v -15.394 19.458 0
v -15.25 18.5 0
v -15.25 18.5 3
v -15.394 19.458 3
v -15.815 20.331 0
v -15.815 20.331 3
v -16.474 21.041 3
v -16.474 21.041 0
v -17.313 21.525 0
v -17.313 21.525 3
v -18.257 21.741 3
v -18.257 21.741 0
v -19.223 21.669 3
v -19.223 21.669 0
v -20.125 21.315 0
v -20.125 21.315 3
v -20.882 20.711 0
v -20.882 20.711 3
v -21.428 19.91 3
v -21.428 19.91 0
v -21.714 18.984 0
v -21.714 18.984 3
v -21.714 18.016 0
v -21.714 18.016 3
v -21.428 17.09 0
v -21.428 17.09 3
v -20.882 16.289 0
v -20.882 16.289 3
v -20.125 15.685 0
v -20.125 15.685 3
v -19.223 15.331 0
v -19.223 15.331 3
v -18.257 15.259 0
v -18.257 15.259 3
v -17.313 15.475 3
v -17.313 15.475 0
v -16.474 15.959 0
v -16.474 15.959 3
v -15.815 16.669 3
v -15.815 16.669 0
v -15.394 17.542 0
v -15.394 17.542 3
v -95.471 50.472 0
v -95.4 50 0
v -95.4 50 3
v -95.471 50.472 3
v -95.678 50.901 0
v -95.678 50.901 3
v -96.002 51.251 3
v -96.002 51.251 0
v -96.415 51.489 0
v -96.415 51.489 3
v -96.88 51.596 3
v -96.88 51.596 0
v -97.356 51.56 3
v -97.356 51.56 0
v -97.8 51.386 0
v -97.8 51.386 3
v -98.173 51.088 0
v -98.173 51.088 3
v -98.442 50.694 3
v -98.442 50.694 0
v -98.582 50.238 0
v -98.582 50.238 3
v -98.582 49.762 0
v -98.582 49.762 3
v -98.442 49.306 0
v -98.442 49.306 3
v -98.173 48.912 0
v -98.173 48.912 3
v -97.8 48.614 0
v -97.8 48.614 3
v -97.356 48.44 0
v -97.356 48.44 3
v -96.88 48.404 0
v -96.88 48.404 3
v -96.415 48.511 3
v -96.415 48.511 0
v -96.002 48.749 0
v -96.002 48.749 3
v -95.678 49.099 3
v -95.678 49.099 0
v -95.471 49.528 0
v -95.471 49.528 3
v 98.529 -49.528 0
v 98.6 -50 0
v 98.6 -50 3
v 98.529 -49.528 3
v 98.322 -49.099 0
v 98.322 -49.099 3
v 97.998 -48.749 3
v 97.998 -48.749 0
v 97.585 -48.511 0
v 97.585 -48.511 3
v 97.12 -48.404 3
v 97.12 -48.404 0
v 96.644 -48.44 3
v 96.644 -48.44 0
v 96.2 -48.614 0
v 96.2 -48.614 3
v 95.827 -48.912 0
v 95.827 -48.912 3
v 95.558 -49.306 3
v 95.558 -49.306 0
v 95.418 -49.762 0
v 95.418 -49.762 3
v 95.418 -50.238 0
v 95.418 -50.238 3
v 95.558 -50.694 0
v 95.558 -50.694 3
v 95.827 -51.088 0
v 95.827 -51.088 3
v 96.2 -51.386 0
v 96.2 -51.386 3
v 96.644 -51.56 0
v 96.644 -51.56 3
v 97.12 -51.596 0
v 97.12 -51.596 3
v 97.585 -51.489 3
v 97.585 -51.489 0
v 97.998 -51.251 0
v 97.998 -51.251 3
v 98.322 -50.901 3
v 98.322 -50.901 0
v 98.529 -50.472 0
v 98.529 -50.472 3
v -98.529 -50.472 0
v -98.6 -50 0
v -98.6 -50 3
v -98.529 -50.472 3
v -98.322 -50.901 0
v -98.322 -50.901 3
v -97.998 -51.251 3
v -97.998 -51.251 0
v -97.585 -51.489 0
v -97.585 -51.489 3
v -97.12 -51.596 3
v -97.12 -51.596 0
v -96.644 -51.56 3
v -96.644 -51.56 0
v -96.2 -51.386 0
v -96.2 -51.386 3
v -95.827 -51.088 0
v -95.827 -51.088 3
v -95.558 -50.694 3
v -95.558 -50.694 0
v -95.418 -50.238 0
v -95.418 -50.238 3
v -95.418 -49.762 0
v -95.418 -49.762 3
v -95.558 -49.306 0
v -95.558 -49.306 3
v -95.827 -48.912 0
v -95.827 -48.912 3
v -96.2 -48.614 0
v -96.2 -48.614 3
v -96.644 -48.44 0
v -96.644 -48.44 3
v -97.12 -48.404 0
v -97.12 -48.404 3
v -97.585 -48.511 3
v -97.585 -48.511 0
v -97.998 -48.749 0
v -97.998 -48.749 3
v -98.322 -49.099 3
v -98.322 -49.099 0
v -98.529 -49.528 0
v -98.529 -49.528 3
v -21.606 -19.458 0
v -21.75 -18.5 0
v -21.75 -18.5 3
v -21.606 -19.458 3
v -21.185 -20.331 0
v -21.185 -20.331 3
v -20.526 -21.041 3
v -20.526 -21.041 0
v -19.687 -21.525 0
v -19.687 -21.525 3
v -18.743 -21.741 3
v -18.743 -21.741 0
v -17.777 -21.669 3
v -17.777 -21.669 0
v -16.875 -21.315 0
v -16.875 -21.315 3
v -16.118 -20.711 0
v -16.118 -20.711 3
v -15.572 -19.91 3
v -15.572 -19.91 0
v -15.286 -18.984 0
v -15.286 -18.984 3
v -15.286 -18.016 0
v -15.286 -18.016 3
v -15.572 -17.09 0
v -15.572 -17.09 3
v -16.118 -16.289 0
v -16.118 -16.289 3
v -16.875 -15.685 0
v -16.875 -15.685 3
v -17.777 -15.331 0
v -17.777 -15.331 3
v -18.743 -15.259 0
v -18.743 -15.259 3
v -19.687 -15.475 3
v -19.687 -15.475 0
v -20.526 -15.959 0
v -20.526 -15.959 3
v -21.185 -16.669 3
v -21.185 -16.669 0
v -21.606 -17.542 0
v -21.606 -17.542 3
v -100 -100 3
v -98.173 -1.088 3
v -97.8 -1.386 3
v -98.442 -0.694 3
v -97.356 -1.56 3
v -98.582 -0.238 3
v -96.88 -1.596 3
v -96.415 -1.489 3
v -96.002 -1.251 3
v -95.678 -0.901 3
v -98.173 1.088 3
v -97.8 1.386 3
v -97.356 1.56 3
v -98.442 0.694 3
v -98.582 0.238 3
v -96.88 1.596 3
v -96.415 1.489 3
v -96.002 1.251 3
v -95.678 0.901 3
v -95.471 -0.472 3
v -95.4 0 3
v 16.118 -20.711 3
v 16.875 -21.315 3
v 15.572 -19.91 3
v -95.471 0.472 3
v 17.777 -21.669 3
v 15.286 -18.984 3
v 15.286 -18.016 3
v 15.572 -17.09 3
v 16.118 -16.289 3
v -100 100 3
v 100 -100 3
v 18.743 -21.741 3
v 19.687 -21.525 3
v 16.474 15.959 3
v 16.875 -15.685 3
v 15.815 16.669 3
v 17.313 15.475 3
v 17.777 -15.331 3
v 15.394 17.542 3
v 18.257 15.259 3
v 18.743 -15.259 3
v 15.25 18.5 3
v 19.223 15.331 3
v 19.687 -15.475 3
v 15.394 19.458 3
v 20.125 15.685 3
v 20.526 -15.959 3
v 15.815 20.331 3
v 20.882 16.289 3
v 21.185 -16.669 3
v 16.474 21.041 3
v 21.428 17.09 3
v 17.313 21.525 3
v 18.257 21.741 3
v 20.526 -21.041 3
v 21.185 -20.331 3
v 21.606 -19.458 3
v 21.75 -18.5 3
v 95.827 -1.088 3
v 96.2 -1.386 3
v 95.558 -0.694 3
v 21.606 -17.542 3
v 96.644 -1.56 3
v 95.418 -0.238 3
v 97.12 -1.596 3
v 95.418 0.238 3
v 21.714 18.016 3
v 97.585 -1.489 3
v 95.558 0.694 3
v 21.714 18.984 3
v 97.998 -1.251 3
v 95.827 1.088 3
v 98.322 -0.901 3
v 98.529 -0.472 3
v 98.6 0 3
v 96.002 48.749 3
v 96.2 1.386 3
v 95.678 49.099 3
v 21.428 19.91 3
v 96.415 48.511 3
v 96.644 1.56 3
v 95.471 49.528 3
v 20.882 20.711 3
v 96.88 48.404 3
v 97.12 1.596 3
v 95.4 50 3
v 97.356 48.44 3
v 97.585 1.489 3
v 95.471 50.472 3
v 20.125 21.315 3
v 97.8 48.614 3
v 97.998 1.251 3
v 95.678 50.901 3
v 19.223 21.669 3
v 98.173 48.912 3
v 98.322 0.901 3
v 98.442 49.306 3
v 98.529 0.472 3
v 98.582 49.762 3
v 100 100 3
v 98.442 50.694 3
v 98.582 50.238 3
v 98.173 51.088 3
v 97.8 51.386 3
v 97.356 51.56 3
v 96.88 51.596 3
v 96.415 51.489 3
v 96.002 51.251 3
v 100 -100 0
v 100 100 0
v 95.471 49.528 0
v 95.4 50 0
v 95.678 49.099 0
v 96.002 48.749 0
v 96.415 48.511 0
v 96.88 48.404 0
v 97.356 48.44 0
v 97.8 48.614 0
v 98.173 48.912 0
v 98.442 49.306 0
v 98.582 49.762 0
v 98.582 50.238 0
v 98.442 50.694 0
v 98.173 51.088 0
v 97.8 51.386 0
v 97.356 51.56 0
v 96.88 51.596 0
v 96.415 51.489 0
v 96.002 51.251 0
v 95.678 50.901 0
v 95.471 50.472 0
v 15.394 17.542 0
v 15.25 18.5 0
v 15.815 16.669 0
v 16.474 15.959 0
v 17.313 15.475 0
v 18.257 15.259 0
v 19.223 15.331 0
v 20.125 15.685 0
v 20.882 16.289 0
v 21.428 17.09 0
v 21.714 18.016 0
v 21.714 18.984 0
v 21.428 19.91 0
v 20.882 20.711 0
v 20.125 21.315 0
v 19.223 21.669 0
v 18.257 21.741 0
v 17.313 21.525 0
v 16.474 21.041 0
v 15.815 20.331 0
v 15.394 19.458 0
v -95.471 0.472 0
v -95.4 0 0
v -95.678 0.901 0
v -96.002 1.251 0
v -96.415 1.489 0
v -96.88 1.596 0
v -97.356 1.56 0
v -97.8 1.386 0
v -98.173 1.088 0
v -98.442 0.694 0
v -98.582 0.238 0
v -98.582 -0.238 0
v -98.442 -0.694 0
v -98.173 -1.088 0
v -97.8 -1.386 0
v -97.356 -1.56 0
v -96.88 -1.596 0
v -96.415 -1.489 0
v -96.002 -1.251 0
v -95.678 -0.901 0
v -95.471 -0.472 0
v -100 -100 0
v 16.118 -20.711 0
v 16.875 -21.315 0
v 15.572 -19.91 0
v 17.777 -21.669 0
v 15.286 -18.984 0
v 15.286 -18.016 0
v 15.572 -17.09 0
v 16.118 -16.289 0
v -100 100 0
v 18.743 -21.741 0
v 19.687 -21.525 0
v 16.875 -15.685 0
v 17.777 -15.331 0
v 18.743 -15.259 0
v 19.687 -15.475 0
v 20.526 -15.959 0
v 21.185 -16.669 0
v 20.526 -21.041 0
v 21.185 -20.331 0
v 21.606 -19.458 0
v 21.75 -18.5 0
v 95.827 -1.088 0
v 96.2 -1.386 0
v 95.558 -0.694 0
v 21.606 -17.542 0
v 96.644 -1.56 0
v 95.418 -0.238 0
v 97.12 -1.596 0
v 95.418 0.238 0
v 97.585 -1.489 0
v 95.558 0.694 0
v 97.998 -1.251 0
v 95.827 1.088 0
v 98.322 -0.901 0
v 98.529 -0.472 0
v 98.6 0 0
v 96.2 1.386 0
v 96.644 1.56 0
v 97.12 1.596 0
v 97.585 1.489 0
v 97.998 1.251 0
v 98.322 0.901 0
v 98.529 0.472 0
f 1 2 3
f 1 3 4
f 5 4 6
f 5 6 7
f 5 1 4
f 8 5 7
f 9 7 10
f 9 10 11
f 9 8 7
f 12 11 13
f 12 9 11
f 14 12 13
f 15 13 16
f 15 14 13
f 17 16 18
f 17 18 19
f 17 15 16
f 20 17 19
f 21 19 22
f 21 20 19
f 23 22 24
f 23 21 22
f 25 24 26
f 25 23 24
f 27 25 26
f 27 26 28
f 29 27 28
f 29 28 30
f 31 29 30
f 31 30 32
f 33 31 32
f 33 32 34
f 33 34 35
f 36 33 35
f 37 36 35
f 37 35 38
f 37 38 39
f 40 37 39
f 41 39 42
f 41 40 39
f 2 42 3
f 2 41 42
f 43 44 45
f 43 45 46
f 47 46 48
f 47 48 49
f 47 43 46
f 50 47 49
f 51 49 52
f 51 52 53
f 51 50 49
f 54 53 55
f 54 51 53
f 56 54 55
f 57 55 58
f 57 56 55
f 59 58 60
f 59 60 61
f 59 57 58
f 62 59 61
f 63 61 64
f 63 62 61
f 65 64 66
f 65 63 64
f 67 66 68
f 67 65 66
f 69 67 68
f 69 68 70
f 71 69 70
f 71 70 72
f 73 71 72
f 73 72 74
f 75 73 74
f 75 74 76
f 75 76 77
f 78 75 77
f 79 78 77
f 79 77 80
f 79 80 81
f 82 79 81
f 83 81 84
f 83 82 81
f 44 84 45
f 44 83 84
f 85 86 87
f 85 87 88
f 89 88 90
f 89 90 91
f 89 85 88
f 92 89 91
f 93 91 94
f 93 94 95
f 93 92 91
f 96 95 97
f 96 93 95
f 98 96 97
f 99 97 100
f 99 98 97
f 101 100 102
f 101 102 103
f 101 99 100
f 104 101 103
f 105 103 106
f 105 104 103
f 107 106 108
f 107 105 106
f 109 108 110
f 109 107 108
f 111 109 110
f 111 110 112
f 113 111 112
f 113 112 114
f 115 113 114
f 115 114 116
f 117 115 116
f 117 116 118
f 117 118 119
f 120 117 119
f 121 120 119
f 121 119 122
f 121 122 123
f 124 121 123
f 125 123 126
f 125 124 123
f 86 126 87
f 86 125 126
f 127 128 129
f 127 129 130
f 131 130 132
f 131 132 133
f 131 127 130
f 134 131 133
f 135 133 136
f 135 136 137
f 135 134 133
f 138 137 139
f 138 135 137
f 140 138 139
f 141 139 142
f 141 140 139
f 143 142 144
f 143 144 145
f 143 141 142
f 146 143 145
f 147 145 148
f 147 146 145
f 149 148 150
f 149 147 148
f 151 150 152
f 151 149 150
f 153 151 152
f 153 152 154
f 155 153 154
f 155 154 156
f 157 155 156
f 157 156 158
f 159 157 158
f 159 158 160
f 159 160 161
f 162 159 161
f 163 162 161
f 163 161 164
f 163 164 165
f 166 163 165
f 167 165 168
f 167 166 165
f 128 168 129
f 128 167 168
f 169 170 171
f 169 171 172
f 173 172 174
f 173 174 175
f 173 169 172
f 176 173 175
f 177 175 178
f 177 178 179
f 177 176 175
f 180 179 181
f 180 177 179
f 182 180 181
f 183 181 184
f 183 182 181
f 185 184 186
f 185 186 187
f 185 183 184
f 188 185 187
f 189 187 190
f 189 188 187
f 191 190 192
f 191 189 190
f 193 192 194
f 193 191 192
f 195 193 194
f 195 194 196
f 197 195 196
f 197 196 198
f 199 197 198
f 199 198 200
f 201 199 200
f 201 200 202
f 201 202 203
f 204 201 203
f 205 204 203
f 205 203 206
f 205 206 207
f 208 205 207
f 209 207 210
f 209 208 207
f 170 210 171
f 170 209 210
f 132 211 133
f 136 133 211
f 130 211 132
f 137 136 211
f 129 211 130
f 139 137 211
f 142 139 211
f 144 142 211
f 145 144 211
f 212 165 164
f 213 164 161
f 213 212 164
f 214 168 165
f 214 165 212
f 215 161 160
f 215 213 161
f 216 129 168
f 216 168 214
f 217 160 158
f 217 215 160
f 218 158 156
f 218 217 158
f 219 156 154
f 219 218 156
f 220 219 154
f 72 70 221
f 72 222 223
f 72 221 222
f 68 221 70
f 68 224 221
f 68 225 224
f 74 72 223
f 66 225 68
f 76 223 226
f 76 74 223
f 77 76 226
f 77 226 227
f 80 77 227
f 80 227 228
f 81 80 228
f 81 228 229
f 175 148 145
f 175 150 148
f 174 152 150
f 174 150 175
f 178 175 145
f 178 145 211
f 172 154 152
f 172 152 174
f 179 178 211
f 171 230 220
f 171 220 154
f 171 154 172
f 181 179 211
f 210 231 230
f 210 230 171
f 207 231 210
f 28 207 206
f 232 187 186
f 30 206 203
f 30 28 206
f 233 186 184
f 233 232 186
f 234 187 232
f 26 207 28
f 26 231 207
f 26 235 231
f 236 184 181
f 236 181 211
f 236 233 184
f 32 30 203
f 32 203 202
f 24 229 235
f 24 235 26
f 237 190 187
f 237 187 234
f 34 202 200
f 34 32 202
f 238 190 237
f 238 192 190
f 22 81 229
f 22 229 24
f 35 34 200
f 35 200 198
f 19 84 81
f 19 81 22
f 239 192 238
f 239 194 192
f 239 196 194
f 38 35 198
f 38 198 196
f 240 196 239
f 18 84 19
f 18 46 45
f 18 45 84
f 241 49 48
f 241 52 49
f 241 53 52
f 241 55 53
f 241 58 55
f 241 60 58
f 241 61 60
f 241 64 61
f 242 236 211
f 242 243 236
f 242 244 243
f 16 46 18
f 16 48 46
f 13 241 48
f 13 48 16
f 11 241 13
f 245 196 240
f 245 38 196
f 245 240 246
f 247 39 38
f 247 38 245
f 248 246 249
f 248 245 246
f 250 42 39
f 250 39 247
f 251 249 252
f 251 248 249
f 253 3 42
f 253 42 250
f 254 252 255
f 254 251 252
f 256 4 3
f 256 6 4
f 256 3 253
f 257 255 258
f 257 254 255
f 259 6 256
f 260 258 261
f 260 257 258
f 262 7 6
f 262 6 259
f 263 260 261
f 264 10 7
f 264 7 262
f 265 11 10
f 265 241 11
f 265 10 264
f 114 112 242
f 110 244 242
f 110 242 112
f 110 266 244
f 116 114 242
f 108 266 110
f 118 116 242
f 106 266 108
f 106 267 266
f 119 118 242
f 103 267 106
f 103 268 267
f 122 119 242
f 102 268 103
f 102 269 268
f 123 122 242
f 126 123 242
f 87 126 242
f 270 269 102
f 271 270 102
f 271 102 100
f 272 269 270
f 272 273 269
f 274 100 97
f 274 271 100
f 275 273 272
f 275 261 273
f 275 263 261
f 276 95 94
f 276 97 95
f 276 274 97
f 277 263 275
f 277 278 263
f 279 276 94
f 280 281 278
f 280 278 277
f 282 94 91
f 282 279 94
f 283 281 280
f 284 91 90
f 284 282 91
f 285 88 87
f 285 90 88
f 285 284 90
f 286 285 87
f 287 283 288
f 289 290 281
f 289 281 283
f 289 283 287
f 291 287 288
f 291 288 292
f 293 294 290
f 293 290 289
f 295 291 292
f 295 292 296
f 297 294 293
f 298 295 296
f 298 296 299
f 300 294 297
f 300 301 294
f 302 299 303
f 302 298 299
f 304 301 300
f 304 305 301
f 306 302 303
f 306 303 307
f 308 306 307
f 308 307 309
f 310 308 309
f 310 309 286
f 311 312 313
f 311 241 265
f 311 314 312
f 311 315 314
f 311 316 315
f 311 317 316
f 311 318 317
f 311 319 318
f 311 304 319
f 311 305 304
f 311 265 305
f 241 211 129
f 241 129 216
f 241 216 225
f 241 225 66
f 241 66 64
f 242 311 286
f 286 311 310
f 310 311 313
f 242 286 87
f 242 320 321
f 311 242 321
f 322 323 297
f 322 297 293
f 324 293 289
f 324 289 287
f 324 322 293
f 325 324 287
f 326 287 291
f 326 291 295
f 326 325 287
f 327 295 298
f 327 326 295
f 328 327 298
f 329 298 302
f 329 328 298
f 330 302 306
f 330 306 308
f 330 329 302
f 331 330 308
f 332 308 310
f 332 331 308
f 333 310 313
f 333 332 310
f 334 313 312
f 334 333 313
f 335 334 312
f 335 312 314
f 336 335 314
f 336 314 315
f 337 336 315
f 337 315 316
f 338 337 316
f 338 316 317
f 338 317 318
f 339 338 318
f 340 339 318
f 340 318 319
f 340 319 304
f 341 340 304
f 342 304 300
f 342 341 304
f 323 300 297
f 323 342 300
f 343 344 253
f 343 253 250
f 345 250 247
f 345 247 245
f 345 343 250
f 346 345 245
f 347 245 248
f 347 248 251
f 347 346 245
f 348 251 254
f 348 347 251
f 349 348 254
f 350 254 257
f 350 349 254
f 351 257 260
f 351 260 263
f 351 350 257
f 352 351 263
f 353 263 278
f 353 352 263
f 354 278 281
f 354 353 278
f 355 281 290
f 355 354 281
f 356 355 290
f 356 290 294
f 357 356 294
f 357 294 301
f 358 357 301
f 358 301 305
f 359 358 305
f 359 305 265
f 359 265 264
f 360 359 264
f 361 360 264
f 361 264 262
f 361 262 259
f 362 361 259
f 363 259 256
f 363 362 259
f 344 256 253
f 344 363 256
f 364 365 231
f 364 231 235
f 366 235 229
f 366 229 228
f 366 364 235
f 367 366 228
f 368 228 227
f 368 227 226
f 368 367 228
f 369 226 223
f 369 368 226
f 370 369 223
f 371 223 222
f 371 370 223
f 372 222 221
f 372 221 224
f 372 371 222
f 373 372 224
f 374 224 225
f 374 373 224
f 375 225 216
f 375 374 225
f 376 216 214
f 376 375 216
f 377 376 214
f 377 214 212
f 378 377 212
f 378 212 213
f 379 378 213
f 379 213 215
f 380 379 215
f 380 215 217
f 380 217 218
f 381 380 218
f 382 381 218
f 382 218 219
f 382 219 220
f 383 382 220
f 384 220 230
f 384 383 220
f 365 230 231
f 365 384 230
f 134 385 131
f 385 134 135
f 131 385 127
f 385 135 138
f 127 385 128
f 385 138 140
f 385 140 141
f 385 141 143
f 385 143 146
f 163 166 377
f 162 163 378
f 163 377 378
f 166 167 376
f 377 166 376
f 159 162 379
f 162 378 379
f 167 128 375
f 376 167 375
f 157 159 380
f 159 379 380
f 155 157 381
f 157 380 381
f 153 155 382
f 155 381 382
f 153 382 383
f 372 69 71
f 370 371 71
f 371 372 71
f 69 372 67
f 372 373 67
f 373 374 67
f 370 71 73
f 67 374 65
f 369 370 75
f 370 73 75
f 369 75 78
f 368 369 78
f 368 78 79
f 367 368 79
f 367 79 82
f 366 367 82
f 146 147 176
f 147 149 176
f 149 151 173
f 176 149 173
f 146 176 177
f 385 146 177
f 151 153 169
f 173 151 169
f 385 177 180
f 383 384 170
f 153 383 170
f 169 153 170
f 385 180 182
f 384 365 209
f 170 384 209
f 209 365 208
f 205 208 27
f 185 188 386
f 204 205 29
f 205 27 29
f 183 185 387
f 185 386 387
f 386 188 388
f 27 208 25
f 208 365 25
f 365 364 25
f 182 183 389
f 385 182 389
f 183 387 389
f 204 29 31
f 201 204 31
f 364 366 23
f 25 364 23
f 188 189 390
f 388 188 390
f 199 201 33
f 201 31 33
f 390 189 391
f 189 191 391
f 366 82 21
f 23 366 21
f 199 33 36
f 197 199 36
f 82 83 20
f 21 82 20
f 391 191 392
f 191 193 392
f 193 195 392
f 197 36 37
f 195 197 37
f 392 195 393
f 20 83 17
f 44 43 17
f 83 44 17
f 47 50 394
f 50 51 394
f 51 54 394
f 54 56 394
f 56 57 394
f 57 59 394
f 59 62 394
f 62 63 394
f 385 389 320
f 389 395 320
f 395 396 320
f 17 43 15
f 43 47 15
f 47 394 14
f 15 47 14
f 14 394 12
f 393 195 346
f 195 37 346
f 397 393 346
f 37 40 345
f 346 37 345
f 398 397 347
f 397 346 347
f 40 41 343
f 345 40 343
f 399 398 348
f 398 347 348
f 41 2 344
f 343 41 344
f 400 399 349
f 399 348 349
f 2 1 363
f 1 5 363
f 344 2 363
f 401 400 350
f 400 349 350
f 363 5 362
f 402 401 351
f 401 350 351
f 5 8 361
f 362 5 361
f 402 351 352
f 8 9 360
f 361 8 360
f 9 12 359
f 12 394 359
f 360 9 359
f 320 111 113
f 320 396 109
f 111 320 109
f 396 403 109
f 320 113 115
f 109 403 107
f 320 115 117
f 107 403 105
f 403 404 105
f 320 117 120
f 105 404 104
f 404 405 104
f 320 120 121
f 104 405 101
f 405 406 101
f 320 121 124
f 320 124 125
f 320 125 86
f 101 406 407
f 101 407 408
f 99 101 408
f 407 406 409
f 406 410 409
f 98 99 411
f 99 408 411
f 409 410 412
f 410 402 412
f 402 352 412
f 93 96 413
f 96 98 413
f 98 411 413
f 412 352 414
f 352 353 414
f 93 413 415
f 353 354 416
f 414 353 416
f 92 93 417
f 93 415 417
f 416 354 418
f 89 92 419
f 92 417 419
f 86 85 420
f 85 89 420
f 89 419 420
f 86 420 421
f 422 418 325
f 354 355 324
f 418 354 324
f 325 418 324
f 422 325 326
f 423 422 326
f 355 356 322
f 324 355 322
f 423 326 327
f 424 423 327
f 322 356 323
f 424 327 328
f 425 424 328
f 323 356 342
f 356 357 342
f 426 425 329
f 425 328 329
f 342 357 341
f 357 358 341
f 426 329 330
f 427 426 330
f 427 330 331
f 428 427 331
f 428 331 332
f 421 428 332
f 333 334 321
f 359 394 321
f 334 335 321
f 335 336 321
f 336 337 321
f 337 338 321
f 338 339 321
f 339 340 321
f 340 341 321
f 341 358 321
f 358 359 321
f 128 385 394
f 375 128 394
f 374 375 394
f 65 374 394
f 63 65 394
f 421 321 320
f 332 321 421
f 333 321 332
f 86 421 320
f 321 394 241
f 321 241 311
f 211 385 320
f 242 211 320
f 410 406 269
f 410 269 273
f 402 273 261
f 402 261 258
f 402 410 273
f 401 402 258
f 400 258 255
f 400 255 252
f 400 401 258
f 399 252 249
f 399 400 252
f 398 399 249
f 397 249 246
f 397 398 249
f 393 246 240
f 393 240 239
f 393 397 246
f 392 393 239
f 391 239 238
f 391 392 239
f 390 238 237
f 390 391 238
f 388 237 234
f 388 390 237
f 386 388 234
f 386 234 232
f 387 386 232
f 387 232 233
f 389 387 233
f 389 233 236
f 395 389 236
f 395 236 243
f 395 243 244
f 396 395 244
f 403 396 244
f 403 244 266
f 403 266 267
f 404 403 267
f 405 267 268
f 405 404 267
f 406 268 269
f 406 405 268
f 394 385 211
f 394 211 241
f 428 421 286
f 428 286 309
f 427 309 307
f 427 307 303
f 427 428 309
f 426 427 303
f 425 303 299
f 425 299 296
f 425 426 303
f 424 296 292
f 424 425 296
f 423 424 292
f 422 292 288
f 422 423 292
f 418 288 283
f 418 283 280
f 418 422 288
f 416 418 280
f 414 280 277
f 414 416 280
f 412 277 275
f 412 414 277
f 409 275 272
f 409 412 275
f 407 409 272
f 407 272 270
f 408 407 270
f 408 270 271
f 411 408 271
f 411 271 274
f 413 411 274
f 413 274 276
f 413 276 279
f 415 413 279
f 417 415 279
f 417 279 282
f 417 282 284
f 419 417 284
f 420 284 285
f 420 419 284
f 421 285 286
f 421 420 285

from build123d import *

# Parameters (mm, degrees)
SKETCH_1_W      = 200
SKETCH_1_H      = 200
SKETCH_1_R      = 3.25
SKETCH_1_R_2    = 1.6
EXTRUDE_1_DEPTH = 3


with BuildPart() as part:
    # 草图1 → 凸台-拉伸1 (new body)
    with BuildSketch(Plane.XY):
        Rectangle(SKETCH_1_W, SKETCH_1_H)
        with Locations((-18.5, 18.5)):
            Circle(SKETCH_1_R, mode=Mode.SUBTRACT)
        with Locations(Location((18.5, 18.5, 0), (0, 0, 180))):
            Circle(SKETCH_1_R, mode=Mode.SUBTRACT)
        with Locations((18.5, -18.5)):
            Circle(SKETCH_1_R, mode=Mode.SUBTRACT)
        with Locations(Location((-18.5, -18.5, 0), (0, 0, 180))):
            Circle(SKETCH_1_R, mode=Mode.SUBTRACT)
        with Locations((97, -50)):
            Circle(SKETCH_1_R_2, mode=Mode.SUBTRACT)
        with Locations(Location((97, 50, 0), (0, 0, 180))):
            Circle(SKETCH_1_R_2, mode=Mode.SUBTRACT)
        with Locations(Location((-97, -50, 0), (0, 0, 180))):
            Circle(SKETCH_1_R_2, mode=Mode.SUBTRACT)
        with Locations((-97, 50)):
            Circle(SKETCH_1_R_2, mode=Mode.SUBTRACT)
        with Locations((-97, 0)):
            Circle(SKETCH_1_R_2, mode=Mode.SUBTRACT)
        with Locations((97, 0)):
            Circle(SKETCH_1_R_2, mode=Mode.SUBTRACT)
    extrude(amount=EXTRUDE_1_DEPTH)


solid = part.part
